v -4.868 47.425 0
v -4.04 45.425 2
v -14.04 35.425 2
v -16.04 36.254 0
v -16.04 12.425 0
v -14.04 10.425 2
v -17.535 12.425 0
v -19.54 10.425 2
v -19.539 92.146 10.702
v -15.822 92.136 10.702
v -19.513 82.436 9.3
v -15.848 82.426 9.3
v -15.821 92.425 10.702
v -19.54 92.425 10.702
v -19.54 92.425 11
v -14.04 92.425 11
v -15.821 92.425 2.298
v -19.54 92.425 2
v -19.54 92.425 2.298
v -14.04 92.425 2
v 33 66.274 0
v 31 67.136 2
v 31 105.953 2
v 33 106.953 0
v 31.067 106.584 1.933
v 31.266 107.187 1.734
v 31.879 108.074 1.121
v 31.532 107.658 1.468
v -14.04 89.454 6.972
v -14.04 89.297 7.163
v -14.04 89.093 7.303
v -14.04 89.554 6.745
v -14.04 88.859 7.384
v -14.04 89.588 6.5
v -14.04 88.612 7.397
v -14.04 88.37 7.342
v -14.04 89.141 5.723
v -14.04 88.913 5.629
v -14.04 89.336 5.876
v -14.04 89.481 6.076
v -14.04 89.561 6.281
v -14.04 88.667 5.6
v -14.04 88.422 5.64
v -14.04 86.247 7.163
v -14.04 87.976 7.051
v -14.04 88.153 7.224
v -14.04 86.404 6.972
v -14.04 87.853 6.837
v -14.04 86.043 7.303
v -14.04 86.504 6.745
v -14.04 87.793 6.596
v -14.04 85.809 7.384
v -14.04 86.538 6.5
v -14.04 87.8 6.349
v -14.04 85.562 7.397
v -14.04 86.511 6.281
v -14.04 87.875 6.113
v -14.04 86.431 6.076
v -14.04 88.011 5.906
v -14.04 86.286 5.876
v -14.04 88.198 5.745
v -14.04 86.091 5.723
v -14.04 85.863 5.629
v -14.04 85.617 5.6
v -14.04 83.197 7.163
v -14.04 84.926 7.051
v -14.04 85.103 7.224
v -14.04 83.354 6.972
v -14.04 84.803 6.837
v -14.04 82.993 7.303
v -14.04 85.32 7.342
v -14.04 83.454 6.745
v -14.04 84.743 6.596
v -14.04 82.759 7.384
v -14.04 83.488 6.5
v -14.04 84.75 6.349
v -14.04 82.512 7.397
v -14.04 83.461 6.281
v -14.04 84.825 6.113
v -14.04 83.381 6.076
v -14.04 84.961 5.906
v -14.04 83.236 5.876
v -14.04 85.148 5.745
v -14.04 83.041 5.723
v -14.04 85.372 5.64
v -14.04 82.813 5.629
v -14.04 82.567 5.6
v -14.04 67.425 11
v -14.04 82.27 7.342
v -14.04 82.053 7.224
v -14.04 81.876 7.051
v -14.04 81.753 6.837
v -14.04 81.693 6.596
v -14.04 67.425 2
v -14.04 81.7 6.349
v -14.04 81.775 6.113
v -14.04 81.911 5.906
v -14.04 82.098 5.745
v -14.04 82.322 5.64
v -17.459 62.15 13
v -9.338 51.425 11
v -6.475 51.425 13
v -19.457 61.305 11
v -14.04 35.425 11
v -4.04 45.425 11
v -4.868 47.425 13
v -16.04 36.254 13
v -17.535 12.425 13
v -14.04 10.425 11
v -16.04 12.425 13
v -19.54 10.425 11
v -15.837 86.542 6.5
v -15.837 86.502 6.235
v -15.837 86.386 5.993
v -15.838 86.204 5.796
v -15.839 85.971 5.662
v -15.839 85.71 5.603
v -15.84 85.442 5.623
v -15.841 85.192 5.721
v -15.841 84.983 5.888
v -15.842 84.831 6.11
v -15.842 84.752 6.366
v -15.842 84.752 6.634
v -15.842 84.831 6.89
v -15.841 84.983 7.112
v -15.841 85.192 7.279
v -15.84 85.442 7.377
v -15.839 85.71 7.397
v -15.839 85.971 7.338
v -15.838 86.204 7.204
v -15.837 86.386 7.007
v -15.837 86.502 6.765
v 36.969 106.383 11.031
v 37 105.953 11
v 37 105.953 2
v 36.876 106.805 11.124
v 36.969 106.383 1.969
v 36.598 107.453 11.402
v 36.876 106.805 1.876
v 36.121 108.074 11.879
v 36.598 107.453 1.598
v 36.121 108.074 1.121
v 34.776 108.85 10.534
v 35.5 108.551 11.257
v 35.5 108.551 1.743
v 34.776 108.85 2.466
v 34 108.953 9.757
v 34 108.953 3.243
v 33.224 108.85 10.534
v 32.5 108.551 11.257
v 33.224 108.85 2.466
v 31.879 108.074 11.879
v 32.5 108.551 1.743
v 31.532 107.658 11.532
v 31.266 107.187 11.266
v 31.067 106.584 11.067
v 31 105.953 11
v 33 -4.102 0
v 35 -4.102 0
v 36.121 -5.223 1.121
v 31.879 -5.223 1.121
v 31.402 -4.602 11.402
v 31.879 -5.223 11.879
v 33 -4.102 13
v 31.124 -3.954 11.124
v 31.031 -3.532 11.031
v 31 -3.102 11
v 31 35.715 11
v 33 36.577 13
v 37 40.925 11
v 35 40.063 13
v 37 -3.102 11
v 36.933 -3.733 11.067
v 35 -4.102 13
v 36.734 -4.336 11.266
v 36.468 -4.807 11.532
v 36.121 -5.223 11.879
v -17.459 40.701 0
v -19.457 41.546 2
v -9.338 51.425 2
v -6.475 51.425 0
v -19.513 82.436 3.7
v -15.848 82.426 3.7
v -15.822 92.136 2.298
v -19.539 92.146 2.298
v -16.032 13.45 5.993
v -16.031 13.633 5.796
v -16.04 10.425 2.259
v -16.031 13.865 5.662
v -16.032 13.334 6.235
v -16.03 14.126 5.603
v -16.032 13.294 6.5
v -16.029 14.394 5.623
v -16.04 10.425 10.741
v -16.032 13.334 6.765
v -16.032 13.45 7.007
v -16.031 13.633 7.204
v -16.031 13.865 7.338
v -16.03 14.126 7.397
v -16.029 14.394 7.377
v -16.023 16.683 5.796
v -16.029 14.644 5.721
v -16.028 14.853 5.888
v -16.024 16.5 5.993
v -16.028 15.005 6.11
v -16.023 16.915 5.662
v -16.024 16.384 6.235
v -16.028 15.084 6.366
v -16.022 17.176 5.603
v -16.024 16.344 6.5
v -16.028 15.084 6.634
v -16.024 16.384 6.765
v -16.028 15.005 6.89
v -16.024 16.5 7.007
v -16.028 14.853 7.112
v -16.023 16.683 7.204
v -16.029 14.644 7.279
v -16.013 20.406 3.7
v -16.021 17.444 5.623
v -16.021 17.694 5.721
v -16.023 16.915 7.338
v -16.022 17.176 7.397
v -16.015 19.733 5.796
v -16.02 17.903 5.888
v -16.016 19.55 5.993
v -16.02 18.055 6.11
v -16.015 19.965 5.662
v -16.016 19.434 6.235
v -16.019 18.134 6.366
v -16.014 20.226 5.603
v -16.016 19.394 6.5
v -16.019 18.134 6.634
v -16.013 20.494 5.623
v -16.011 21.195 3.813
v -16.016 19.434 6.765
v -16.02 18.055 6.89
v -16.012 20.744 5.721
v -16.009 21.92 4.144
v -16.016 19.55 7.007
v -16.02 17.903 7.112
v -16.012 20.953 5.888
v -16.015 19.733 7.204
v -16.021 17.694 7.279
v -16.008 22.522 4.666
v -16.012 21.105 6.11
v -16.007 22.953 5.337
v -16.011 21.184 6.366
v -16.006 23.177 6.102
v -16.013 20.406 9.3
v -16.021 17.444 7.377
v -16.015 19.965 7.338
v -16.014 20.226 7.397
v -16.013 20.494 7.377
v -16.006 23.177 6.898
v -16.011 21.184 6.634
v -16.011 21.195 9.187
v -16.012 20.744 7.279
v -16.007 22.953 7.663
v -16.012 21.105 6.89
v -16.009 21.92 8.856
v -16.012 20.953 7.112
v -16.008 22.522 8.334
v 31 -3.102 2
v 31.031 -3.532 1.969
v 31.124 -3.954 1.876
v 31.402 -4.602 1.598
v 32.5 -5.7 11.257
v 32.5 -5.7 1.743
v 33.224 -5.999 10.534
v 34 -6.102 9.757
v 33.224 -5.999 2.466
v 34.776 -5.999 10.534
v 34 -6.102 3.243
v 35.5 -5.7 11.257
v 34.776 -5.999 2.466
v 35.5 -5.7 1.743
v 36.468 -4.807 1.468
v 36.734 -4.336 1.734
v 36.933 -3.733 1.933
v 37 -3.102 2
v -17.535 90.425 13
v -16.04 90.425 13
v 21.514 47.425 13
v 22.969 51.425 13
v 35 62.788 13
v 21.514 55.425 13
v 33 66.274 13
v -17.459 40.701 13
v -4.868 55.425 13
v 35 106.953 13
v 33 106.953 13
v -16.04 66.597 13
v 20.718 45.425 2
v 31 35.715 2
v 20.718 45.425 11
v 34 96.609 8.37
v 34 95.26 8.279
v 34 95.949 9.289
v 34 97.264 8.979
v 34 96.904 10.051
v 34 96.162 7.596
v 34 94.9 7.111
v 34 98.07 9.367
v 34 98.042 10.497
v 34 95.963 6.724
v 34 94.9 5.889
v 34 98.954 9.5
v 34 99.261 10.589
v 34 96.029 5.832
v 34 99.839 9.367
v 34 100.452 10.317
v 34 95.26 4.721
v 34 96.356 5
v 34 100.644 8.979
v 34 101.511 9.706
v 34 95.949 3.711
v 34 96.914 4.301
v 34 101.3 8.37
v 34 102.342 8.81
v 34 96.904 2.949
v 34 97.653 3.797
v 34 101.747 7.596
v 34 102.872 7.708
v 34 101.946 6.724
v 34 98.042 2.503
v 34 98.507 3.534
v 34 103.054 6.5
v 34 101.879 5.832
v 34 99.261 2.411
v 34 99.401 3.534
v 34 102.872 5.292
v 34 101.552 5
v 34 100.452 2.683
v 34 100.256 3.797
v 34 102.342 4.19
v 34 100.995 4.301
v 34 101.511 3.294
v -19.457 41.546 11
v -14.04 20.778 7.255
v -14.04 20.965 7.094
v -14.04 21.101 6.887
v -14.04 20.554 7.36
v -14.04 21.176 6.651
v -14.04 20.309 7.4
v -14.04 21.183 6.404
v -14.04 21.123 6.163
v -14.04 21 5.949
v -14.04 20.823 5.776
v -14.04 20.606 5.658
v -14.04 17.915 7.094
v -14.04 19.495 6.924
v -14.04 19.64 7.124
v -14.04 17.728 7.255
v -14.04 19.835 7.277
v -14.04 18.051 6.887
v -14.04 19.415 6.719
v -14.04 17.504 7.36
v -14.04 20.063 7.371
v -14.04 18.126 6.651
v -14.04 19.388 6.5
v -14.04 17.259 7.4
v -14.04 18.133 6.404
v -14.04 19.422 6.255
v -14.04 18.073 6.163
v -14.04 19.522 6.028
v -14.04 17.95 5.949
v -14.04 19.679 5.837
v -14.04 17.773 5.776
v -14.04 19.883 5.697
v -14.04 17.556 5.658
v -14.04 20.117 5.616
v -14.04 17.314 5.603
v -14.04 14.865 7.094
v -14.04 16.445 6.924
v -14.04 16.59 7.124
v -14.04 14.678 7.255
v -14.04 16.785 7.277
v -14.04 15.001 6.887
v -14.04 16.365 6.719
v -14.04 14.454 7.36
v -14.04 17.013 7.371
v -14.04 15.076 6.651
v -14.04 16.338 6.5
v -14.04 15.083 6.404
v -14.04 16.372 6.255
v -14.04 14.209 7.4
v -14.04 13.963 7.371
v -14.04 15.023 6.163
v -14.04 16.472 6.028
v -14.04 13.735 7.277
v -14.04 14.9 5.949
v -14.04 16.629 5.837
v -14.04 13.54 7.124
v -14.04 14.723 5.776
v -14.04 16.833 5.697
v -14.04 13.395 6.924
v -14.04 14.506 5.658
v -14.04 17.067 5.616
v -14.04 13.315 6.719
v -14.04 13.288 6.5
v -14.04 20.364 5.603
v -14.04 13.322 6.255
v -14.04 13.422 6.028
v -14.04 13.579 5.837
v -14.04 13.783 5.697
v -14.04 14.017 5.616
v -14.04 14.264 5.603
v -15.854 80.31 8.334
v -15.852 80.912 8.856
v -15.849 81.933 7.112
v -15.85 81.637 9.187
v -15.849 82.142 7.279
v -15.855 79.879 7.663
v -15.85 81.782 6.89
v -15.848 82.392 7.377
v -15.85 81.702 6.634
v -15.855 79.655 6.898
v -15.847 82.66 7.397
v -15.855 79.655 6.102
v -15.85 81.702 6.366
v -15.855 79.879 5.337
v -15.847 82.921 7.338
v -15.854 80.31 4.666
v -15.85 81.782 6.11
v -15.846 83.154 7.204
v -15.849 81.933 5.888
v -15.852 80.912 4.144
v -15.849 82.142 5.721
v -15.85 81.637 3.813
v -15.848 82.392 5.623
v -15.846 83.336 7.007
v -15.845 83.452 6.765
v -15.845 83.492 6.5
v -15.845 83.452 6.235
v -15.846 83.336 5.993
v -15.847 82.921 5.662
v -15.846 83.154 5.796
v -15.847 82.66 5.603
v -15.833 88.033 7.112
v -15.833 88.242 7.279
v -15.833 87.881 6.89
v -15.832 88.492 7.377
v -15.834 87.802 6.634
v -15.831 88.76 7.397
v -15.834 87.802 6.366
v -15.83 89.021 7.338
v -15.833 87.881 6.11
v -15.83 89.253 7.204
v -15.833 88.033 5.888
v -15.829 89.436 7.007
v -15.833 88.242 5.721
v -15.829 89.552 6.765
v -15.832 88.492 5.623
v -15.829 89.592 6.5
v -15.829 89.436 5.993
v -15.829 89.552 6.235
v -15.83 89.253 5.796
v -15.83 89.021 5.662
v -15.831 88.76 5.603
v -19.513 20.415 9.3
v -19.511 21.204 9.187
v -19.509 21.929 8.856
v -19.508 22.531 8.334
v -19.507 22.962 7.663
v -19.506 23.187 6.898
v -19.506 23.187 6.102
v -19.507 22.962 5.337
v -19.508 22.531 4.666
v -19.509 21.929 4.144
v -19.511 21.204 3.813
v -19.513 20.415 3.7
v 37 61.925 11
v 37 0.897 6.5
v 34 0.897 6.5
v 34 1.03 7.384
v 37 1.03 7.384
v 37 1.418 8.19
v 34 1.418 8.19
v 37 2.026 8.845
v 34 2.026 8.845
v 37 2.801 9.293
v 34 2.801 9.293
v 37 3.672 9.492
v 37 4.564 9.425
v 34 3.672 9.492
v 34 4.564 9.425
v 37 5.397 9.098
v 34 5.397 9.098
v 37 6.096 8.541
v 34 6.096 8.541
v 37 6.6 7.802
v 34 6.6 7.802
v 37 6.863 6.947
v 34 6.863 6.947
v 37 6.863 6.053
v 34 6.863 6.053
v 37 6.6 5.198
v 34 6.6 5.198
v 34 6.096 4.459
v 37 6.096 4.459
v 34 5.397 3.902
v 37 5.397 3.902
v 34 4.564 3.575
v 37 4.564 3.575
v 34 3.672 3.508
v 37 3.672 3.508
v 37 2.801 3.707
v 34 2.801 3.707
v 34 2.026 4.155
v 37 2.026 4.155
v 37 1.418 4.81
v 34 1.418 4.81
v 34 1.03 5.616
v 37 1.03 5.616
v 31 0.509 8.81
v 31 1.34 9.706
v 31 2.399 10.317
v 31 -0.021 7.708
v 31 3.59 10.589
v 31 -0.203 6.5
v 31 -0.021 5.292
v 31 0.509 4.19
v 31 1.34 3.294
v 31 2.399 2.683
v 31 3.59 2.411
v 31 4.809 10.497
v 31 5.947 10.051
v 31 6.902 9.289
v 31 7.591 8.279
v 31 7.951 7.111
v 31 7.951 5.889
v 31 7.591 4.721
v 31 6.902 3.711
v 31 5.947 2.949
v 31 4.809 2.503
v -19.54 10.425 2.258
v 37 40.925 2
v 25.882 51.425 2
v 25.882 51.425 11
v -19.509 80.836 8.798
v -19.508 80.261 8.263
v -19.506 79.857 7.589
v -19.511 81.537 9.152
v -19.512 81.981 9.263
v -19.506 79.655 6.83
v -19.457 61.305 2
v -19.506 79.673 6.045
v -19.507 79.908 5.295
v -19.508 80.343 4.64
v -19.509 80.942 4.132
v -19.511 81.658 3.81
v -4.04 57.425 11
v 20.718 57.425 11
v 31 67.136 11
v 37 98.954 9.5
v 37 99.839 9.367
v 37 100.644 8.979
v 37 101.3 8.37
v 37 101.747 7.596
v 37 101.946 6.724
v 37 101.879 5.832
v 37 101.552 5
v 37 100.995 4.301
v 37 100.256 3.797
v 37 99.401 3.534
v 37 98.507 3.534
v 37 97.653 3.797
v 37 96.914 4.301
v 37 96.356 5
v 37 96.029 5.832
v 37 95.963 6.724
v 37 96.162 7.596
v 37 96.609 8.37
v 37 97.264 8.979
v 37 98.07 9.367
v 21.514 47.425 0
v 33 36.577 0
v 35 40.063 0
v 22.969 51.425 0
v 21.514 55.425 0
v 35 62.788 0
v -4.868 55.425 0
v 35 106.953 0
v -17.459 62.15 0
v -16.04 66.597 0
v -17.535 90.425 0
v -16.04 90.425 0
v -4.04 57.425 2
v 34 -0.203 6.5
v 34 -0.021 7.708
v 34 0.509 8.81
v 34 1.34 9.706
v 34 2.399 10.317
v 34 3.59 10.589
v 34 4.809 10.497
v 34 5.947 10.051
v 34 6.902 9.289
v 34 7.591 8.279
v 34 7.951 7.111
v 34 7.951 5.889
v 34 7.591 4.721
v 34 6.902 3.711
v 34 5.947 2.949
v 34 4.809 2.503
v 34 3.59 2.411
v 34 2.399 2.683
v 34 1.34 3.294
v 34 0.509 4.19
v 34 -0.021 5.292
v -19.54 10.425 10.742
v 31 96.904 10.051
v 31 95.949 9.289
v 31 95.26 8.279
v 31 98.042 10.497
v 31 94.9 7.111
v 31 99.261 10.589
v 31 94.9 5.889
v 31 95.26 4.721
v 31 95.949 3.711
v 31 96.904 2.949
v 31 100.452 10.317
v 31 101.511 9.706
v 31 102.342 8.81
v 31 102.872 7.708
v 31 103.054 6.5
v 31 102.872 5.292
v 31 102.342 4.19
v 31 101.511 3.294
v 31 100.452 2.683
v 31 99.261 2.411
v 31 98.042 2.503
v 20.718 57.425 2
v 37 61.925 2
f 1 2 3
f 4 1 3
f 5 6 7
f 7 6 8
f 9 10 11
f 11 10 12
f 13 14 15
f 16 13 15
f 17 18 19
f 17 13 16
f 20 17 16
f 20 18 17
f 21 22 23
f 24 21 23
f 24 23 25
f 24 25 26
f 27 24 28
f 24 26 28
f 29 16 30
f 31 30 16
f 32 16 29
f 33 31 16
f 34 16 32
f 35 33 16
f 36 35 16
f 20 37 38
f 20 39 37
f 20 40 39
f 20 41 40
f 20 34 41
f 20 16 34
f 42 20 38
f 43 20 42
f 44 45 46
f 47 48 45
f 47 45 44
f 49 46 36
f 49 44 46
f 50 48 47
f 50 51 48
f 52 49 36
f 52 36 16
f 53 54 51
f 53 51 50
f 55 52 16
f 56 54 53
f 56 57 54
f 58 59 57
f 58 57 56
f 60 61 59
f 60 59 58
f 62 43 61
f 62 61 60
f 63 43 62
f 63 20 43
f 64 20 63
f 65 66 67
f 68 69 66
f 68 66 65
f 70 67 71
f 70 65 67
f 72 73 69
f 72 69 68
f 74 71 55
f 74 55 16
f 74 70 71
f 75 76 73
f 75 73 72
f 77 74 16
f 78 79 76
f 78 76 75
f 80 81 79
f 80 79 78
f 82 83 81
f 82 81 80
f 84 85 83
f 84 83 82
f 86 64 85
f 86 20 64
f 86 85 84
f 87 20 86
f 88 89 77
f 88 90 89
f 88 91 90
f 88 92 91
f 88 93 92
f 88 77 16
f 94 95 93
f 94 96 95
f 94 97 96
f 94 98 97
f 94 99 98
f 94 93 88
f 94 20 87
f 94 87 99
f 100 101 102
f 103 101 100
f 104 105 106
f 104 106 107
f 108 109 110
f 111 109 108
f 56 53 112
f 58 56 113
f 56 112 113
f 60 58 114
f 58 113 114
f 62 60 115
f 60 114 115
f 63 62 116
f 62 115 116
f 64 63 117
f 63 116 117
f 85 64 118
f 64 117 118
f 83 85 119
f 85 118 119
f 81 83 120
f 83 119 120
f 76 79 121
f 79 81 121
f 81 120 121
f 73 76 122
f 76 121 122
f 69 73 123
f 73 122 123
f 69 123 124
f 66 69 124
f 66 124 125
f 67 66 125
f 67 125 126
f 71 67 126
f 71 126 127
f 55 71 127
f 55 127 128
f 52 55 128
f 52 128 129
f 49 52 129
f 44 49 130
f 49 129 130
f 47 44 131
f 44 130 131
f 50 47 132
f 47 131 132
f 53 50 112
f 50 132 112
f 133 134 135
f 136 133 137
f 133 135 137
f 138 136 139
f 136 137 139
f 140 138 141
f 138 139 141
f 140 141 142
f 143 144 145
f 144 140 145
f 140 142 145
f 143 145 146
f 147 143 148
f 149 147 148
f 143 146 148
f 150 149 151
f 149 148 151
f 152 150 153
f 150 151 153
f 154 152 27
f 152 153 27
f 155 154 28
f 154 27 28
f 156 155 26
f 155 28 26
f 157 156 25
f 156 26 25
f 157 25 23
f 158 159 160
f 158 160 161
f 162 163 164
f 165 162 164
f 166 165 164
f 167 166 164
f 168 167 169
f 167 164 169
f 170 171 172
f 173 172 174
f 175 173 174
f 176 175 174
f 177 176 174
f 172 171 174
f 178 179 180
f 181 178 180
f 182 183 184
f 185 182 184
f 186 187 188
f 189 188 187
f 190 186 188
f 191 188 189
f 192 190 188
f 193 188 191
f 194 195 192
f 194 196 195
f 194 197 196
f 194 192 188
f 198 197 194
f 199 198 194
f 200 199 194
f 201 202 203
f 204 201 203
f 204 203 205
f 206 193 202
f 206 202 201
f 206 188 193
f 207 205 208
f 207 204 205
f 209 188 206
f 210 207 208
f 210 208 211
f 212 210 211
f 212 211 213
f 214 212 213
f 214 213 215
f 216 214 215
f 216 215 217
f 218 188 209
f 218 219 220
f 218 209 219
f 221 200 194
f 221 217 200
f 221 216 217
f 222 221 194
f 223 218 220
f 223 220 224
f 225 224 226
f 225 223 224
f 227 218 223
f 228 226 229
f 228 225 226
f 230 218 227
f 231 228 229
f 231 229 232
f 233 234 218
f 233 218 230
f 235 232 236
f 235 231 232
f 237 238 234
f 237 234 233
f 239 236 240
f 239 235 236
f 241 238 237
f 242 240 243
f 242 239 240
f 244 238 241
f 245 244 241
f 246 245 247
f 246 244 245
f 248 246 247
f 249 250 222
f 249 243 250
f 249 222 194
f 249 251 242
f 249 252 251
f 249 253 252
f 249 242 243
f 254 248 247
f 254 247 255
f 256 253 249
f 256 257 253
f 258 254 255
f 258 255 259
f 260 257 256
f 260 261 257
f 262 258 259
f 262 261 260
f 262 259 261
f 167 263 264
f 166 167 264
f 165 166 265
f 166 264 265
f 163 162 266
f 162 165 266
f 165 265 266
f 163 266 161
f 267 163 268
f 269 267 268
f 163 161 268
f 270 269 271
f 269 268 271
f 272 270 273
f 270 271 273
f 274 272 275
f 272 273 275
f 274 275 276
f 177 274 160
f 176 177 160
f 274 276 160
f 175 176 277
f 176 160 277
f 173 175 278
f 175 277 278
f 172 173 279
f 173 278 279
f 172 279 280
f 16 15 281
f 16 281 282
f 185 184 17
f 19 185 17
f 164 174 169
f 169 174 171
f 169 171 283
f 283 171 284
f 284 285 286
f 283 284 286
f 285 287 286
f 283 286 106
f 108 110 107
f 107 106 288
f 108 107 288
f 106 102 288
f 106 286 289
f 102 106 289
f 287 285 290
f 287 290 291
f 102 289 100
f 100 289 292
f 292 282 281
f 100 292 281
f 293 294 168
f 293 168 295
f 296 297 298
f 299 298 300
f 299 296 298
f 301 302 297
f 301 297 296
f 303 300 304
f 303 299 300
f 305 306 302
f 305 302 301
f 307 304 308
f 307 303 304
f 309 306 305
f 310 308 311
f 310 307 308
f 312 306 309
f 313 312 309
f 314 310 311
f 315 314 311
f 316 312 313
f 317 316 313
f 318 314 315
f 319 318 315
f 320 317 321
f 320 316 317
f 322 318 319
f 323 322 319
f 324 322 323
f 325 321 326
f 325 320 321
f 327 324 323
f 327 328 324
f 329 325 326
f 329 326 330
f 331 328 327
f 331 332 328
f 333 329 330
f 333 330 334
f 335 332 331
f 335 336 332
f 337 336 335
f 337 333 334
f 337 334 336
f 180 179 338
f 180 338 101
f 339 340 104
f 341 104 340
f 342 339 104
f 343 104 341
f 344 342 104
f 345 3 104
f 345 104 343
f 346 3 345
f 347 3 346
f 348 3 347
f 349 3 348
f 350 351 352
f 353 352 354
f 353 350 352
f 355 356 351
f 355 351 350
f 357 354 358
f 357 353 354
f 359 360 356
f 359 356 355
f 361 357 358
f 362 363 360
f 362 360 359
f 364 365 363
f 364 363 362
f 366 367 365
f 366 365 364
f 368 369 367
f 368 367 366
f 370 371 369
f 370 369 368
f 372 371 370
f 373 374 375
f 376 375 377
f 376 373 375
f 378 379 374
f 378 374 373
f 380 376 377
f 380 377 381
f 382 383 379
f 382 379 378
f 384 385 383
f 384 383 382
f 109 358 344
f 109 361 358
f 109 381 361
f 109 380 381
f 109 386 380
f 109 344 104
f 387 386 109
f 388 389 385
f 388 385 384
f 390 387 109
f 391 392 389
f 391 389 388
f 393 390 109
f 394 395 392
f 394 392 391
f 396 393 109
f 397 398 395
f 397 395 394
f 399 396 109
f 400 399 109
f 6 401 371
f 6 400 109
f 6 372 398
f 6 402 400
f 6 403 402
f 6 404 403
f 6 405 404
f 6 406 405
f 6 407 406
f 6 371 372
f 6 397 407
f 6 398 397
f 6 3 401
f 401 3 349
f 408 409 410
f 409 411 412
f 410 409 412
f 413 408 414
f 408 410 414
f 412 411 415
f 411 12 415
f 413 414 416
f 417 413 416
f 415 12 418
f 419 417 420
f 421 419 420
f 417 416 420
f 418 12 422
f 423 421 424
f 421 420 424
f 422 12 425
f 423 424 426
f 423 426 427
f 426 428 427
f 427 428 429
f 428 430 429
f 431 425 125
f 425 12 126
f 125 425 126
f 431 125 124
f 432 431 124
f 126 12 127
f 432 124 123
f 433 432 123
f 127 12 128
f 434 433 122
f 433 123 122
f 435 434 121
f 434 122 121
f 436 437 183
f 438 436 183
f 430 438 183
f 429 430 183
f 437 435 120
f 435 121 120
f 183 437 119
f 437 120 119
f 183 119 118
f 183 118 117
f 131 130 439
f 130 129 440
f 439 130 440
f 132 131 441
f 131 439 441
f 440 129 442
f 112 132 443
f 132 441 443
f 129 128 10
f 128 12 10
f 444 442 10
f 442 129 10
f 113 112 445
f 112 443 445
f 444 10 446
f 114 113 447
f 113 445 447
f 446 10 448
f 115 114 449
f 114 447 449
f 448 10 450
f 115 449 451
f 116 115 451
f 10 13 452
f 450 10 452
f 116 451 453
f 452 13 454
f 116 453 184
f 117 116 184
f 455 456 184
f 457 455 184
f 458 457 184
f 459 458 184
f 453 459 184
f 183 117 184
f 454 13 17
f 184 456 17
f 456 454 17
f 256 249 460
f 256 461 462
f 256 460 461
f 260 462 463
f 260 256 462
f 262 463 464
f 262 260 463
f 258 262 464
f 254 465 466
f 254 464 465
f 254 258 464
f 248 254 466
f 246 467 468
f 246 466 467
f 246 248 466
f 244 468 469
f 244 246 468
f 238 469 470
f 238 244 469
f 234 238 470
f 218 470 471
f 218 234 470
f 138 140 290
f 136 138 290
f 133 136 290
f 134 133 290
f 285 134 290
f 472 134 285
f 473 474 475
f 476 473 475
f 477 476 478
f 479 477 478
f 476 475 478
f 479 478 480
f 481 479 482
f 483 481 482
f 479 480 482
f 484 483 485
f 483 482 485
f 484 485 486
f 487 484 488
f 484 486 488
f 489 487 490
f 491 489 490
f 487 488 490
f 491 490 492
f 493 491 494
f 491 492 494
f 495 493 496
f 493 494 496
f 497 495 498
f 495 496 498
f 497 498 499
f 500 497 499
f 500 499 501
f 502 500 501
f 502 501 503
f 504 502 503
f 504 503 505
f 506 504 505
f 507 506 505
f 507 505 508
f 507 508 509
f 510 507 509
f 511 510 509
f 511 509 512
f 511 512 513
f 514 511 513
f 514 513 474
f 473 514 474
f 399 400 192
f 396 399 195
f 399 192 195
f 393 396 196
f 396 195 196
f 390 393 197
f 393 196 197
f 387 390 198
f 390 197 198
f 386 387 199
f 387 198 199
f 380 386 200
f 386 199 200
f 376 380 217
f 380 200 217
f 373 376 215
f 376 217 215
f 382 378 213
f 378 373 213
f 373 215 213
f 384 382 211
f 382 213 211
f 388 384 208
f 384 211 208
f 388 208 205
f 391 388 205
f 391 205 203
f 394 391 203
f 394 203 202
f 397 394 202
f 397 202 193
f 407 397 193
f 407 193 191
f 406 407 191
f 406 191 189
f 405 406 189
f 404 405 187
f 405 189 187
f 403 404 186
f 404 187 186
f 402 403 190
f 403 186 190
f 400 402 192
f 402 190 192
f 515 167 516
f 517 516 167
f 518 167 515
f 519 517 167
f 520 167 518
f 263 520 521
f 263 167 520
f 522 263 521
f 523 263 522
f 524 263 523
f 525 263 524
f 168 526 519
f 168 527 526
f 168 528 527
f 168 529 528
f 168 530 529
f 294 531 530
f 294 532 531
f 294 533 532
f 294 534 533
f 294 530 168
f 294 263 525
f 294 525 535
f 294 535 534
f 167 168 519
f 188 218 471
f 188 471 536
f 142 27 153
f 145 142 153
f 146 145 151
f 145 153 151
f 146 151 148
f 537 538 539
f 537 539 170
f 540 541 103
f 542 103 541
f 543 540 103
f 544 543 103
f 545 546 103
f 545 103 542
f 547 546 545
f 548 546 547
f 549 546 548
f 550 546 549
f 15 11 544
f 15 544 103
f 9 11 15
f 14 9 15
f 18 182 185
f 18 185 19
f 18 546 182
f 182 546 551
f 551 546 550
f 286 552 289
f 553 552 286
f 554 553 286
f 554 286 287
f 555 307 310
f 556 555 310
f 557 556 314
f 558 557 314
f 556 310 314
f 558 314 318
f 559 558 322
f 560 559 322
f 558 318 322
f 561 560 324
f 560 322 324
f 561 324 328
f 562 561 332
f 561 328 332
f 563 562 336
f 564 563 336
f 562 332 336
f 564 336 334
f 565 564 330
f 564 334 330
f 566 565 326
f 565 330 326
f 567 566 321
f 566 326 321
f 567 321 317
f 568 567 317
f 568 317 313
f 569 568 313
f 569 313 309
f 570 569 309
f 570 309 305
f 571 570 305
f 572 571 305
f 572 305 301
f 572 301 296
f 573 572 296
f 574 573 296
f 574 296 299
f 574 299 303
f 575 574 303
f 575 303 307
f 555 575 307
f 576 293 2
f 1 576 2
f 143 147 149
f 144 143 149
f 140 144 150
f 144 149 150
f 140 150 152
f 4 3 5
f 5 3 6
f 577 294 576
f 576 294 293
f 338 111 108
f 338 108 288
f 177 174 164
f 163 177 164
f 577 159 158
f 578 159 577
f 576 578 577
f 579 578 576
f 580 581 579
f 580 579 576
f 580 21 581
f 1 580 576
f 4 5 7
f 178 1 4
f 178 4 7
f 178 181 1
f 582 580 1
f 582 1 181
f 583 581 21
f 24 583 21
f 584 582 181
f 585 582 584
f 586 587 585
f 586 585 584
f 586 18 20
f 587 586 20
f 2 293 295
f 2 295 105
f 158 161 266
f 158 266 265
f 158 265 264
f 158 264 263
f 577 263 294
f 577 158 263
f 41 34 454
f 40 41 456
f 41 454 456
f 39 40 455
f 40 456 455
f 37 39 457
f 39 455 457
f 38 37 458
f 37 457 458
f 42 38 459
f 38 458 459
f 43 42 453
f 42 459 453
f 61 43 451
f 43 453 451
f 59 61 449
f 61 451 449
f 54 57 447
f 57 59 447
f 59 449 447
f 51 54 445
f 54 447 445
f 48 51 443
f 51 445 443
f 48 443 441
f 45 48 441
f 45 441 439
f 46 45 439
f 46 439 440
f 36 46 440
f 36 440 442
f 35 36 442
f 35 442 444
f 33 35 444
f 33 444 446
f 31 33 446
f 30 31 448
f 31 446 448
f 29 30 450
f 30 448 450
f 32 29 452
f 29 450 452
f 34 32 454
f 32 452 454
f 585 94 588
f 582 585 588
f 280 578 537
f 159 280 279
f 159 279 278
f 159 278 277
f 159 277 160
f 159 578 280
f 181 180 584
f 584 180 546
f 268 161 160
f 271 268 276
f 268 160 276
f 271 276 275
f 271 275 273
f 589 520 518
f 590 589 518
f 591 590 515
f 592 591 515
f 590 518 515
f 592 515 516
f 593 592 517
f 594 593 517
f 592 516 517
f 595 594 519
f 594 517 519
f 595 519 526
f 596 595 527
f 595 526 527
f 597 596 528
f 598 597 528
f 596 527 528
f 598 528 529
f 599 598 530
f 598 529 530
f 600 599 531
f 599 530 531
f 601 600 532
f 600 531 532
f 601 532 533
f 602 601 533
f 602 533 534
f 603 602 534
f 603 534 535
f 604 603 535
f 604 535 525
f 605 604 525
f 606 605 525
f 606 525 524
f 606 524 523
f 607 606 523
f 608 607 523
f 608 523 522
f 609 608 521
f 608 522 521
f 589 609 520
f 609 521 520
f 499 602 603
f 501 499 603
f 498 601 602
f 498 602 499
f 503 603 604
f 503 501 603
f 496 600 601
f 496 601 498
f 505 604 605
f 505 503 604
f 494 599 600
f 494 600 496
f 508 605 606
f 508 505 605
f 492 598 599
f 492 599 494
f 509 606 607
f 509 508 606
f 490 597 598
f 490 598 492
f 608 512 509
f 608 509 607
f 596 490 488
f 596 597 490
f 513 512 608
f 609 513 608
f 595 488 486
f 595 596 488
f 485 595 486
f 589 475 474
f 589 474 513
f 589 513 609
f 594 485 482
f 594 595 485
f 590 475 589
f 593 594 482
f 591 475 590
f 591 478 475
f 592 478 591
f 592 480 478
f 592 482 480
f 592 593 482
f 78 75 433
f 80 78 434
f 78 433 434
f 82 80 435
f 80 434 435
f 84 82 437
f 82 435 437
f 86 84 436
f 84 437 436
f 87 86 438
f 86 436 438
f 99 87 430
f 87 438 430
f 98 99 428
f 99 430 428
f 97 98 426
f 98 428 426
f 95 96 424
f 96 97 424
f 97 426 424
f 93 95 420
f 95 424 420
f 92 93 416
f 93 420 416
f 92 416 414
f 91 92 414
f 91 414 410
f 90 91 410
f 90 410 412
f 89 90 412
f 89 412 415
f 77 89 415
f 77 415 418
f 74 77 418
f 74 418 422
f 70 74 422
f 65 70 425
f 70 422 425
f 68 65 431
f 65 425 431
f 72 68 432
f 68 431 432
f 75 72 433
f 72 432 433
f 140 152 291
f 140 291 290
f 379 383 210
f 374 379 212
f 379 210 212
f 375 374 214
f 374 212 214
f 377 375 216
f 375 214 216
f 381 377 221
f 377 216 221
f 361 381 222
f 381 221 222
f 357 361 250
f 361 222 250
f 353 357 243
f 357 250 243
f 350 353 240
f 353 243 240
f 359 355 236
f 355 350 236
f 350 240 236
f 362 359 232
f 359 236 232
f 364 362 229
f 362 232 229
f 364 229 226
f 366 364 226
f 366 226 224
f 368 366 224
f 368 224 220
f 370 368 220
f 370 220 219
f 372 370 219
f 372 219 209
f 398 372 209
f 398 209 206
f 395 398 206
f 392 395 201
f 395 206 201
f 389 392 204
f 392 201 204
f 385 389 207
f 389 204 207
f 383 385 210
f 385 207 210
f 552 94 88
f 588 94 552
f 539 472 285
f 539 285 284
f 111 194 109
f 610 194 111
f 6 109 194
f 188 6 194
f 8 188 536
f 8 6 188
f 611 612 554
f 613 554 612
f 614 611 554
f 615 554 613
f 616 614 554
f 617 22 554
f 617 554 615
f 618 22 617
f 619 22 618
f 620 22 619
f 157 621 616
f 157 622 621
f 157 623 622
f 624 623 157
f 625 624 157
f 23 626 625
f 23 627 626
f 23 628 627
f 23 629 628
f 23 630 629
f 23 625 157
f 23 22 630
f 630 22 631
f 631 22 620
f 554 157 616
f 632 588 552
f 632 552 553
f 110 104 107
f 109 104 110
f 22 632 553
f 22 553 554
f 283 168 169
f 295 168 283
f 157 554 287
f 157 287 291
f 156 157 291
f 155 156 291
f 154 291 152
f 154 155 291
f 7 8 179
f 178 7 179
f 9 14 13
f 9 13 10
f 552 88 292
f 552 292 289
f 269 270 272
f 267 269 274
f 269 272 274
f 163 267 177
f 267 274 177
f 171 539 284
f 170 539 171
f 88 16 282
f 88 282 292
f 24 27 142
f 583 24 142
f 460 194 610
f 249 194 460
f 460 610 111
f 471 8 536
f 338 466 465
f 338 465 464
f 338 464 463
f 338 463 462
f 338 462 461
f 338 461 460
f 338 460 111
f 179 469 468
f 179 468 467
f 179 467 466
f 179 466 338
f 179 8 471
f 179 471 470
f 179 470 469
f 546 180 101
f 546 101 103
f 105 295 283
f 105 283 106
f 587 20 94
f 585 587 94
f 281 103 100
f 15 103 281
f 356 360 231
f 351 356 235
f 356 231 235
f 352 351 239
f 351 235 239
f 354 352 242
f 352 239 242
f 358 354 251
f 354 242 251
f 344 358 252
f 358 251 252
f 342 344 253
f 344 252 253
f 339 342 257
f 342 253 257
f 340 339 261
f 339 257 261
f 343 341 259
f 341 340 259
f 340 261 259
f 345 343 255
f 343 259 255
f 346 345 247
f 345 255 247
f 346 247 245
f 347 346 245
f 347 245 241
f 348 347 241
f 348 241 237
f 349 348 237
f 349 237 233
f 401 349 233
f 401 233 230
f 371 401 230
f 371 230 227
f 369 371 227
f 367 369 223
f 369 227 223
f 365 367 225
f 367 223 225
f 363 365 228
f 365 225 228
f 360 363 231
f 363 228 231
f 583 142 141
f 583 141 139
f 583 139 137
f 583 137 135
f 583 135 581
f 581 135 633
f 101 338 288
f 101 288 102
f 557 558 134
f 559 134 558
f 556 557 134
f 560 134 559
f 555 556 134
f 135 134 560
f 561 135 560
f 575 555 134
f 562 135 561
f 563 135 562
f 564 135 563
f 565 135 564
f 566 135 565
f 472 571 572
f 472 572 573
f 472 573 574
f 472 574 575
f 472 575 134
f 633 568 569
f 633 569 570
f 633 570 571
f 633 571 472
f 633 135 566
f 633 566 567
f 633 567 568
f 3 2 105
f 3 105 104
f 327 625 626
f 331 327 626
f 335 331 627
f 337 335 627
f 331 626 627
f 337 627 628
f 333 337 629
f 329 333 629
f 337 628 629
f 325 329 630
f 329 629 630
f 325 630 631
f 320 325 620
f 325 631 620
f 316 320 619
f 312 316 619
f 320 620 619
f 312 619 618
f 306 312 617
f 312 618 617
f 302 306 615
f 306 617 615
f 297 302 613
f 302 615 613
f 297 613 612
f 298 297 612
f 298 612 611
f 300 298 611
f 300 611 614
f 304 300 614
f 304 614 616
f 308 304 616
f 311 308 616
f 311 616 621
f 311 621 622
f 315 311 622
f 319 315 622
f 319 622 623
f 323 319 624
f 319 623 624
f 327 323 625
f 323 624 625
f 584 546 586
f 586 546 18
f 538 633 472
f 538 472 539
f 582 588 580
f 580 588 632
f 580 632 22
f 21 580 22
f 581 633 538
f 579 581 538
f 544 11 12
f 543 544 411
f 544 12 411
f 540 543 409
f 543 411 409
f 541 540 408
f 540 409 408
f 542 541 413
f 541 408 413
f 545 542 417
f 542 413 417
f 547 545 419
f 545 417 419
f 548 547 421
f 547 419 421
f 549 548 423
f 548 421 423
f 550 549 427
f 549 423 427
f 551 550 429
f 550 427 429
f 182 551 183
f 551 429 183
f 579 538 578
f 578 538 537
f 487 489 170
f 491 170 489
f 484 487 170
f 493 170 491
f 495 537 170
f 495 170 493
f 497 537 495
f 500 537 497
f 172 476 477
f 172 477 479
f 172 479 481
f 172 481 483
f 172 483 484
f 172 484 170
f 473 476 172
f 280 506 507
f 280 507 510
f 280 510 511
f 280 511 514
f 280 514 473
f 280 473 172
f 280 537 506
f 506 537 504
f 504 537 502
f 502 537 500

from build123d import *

# Parameters (mm, degrees)
EXTRUDE_3_DEPTH          = 13
CUT_EXTRUDE_1_DEPTH      = 10
CUT_EXTRUDE_1_DEPTH_BACK = 3.5
SKETCH_5_R               = 0.9
CUT_EXTRUDE_2_DEPTH      = 3.9
SKETCH_7_R               = 4.1
CUT_EXTRUDE_3_DEPTH      = 3
SKETCH_8_R               = 3
CUT_EXTRUDE_4_DEPTH      = 10
CHAMFER_1_SIZE           = 2
FILLET_1_R               = 3


with BuildPart() as part:
    # Эскиз3 → Бобышка-Вытянуть3 (new body)
    with BuildSketch(Plane.XY):
        Polygon((37, -6.101609525), (31, -6.101609525), (31, 35.715183329), (20.718431003, 45.425453097), (-4.040001338, 45.425453097), (-14.040001338, 35.425453097), (-14.040001338, 10.425453097), (-19.540001338, 10.425453097), (-19.457025681, 41.54590709), (-9.338005437, 51.425453097), (-19.457025681, 61.304999103), (-19.540001338, 92.425453097), (-14.040001338, 92.425453097), (-14.040001338, 67.425453097), (-4.040001338, 57.425453097), (20.718431003, 57.425453097), (31, 67.135722864), (31, 108.952515718), (37, 108.952515718), (37, 61.925453097), (25.882237358, 51.425453097), (37, 40.925453097), align=None)
    extrude(amount=EXTRUDE_3_DEPTH)

    # Эскиз4 → Вырез-Вытянуть1 (cut, two sides: drawn at the far end of the back side and taken through both)
    with BuildSketch(Plane(origin=(-19.567659345, 0.052172741, 0), x_dir=(0, 0, 1), z_dir=(-0.9999964455104726, 0.0026662645068428353, 0)).offset(-CUT_EXTRUDE_1_DEPTH_BACK)):
        with BuildLine():
            Line((2.257723781, 10.373317227), (10.742275161, 10.373317227))
            Line((10.742275161, 10.373317227), (9.300003079, 20.36302214))
            ThreePointArc((9.300003079, 20.36302214), (6.5, 23.163025219), (3.699996921, 20.36302214))
            Line((3.699996921, 20.36302214), (2.257723781, 10.373317227))
        make_face()
        with BuildLine():
            Line((10.701924393, 92.093833026), (9.300003079, 82.383612315))
            ThreePointArc((9.300003079, 82.383612315), (6.5, 79.583609236), (3.699996921, 82.383612315))
            Line((3.699996921, 82.383612315), (2.298075607, 92.093833026))
            Line((2.298075607, 92.093833026), (2.298075607, 92.652801429))
            Line((2.298075607, 92.652801429), (10.701924393, 92.652801429))
            Line((10.701924393, 92.652801429), (10.701924393, 92.093833026))
        make_face()
    extrude(amount=CUT_EXTRUDE_1_DEPTH + CUT_EXTRUDE_1_DEPTH_BACK, mode=Mode.SUBTRACT)

    # Эскиз5 → Вырез-Вытянуть2 (cut)
    with BuildSketch(Plane(origin=(-16.067671786, 0.042840815, 0), x_dir=(0, 0, 1), z_dir=(-0.9999964455104726, 0.0026662645068428353, 0))):
        with Locations(Location((6.5, 20.250905412, 0), (0, 0, 270))):
            Circle(SKETCH_5_R)
        with Locations(Location((6.5, 17.200915994, 0), (0, 0, 270))):
            Circle(SKETCH_5_R)
        with Locations(Location((6.5, 14.150926575, 0), (0, 0, 270))):
            Circle(SKETCH_5_R)
        with Locations(Location((6.5, 88.64981885, 0), (0, 0, 90))):
            Circle(SKETCH_5_R)
        with Locations(Location((6.5, 85.599829432, 0), (0, 0, 90))):
            Circle(SKETCH_5_R)
        with Locations(Location((6.5, 82.549840014, 0), (0, 0, 90))):
            Circle(SKETCH_5_R)
    extrude(amount=-CUT_EXTRUDE_2_DEPTH, mode=Mode.SUBTRACT)

    # Эскиз7 → Вырез-Вытянуть3 (cut)
    with BuildSketch(Plane.ZY.offset(-31)):
        with Locations(Location((6.5, 3.89666543, 0), (0, 0, 270))):
            Circle(SKETCH_7_R)
        with Locations(Location((6.5, 98.954240763, 0), (0, 0, 90))):
            Circle(SKETCH_7_R)
    extrude(amount=-CUT_EXTRUDE_3_DEPTH, mode=Mode.SUBTRACT)

    # Эскиз8 → Вырез-Вытянуть4 (cut)
    with BuildSketch(Plane.ZY.offset(-34)):
        with Locations(Location((6.5, 3.89666543, 0), (0, 0, 270))):
            Circle(SKETCH_8_R)
        with Locations((6.5, 98.954240763)):
            Circle(SKETCH_8_R)
    extrude(amount=-CUT_EXTRUDE_4_DEPTH, mode=Mode.SUBTRACT)

    # Фаска1
    chamfer_1_edges = [part.edges().sort_by_distance(p)[0] for p in [
        (25.859215501, 40.570318213, 13),
        (31, 14.806786902, 13),
        (34, -6.101609525, 13),
        (-14.040001338, 22.925453097, 0),
        (37, 17.411921786, 13),
        (-16.790001338, 10.425453097, 0),
        (-19.498513509, 25.985680093, 0),
        (-14.397515559, 46.485680093, 0),
        (-14.397515559, 56.3652261, 0),
        (-19.498513509, 76.8652261, 0),
        (-16.790001338, 92.425453097, 0),
        (-14.040001338, 79.925453097, 0),
        (31.441118679, 46.175453097, 13),
        (-9.040001338, 62.425453097, 0),
        (8.339214833, 57.425453097, 0),
        (25.859215501, 62.28058798, 0),
        (31, 88.044119291, 0),
        (34, 108.952515718, 0),
        (37, 85.438984407, 0),
        (31.441118679, 56.675453097, 0),
        (31.441118679, 46.175453097, 0),
        (31.441118679, 56.675453097, 13),
        (37, 17.411921786, 0),
        (34, -6.101609525, 0),
        (31, 14.806786902, 0),
        (25.859215501, 40.570318213, 0),
        (8.339214833, 45.425453097, 0),
        (-9.040001338, 40.425453097, 0),
        (37, 85.438984407, 13),
        (34, 108.952515718, 13),
        (31, 88.044119291, 13),
        (25.859215501, 62.28058798, 13),
        (-9.040001338, 40.425453097, 13),
        (8.339214833, 57.425453097, 13),
        (-9.040001338, 62.425453097, 13),
        (-14.040001338, 79.925453097, 13),
        (-16.790001338, 92.425453097, 13),
        (-19.498513509, 76.8652261, 13),
        (-14.397515559, 56.3652261, 13),
        (-14.397515559, 46.485680093, 13),
        (-19.498513509, 25.985680093, 13),
        (-16.790001338, 10.425453097, 13),
        (-14.040001338, 22.925453097, 13),
        (8.339214833, 45.425453097, 13),
    ]]
    chamfer(chamfer_1_edges, length=CHAMFER_1_SIZE)

    # Скругление1
    # the kernel refuses this fillet: 3 mm, written as the material it takes off along each edge
    with BuildSketch(Plane(origin=(31, 108.952515718, -5.5), x_dir=(1, 0, 0), z_dir=(0, 0, 1)), Plane(origin=(37, 108.952515718, -5.5), x_dir=(0, -1, 0), z_dir=(0, 0, 1)), Plane(origin=(37, -6.101609525, -5.5), x_dir=(-1, 0, 0), z_dir=(0, 0, 1))) as fillet_1_piece_1:
        with BuildLine():
            CenterArc((FILLET_1_R, -FILLET_1_R), FILLET_1_R, 90, 90)
            Line((0, -FILLET_1_R), (0, 0))
            Line((0, 0), (FILLET_1_R, 0))
        make_face()
    extrude(amount=24, mode=Mode.SUBTRACT)
    with BuildSketch(Plane(origin=(27.893398282, 108.952515718, 2), x_dir=(0, -0.7071067811865495, -0.7071067811865456), z_dir=(1, 0, 0)), Plane(origin=(40.106601718, -6.101609525, 11), x_dir=(0, 0, -1), z_dir=(-1, 0, 0))) as fillet_1_piece_2:
        with BuildLine():
            CenterArc((FILLET_1_R * 0.414213562373, -FILLET_1_R), FILLET_1_R, 90, 45)
            Line((-FILLET_1_R * 0.292893218813, -FILLET_1_R * 0.292893218813), (0, 0))
            Line((0, 0), (FILLET_1_R * 0.414213562373, 0))
        make_face()
    extrude(amount=12.213203436, mode=Mode.SUBTRACT)
    with BuildSketch(Plane(origin=(27.893398282, 108.952515718, 11), x_dir=(0, -0.7071067811865481, 0.7071067811865467), z_dir=(1, 0, 0)), Plane(origin=(40.106601718, -6.101609525, 2), x_dir=(0, 0, 1), z_dir=(-1, 0, 0))) as fillet_1_piece_3:
        with BuildLine():
            CenterArc((FILLET_1_R * 0.414213562373, FILLET_1_R), FILLET_1_R, 225, 45)
            Line((-FILLET_1_R * 0.292893218813, FILLET_1_R * 0.292893218813), (0, 0))
            Line((0, 0), (FILLET_1_R * 0.414213562373, 0))
        make_face()
    extrude(amount=12.213203436, mode=Mode.SUBTRACT)
    with BuildSketch(Plane(origin=(31, -6.101609525, -5.5), x_dir=(1, 0, 0), z_dir=(0, 0, 1))) as fillet_1_piece_4:
        with BuildLine():
            CenterArc((FILLET_1_R, FILLET_1_R), FILLET_1_R, 180, 90)
            Line((0, FILLET_1_R), (0, 0))
            Line((0, 0), (FILLET_1_R, 0))
        make_face()
    extrude(amount=24, mode=Mode.SUBTRACT)


solid = part.part
